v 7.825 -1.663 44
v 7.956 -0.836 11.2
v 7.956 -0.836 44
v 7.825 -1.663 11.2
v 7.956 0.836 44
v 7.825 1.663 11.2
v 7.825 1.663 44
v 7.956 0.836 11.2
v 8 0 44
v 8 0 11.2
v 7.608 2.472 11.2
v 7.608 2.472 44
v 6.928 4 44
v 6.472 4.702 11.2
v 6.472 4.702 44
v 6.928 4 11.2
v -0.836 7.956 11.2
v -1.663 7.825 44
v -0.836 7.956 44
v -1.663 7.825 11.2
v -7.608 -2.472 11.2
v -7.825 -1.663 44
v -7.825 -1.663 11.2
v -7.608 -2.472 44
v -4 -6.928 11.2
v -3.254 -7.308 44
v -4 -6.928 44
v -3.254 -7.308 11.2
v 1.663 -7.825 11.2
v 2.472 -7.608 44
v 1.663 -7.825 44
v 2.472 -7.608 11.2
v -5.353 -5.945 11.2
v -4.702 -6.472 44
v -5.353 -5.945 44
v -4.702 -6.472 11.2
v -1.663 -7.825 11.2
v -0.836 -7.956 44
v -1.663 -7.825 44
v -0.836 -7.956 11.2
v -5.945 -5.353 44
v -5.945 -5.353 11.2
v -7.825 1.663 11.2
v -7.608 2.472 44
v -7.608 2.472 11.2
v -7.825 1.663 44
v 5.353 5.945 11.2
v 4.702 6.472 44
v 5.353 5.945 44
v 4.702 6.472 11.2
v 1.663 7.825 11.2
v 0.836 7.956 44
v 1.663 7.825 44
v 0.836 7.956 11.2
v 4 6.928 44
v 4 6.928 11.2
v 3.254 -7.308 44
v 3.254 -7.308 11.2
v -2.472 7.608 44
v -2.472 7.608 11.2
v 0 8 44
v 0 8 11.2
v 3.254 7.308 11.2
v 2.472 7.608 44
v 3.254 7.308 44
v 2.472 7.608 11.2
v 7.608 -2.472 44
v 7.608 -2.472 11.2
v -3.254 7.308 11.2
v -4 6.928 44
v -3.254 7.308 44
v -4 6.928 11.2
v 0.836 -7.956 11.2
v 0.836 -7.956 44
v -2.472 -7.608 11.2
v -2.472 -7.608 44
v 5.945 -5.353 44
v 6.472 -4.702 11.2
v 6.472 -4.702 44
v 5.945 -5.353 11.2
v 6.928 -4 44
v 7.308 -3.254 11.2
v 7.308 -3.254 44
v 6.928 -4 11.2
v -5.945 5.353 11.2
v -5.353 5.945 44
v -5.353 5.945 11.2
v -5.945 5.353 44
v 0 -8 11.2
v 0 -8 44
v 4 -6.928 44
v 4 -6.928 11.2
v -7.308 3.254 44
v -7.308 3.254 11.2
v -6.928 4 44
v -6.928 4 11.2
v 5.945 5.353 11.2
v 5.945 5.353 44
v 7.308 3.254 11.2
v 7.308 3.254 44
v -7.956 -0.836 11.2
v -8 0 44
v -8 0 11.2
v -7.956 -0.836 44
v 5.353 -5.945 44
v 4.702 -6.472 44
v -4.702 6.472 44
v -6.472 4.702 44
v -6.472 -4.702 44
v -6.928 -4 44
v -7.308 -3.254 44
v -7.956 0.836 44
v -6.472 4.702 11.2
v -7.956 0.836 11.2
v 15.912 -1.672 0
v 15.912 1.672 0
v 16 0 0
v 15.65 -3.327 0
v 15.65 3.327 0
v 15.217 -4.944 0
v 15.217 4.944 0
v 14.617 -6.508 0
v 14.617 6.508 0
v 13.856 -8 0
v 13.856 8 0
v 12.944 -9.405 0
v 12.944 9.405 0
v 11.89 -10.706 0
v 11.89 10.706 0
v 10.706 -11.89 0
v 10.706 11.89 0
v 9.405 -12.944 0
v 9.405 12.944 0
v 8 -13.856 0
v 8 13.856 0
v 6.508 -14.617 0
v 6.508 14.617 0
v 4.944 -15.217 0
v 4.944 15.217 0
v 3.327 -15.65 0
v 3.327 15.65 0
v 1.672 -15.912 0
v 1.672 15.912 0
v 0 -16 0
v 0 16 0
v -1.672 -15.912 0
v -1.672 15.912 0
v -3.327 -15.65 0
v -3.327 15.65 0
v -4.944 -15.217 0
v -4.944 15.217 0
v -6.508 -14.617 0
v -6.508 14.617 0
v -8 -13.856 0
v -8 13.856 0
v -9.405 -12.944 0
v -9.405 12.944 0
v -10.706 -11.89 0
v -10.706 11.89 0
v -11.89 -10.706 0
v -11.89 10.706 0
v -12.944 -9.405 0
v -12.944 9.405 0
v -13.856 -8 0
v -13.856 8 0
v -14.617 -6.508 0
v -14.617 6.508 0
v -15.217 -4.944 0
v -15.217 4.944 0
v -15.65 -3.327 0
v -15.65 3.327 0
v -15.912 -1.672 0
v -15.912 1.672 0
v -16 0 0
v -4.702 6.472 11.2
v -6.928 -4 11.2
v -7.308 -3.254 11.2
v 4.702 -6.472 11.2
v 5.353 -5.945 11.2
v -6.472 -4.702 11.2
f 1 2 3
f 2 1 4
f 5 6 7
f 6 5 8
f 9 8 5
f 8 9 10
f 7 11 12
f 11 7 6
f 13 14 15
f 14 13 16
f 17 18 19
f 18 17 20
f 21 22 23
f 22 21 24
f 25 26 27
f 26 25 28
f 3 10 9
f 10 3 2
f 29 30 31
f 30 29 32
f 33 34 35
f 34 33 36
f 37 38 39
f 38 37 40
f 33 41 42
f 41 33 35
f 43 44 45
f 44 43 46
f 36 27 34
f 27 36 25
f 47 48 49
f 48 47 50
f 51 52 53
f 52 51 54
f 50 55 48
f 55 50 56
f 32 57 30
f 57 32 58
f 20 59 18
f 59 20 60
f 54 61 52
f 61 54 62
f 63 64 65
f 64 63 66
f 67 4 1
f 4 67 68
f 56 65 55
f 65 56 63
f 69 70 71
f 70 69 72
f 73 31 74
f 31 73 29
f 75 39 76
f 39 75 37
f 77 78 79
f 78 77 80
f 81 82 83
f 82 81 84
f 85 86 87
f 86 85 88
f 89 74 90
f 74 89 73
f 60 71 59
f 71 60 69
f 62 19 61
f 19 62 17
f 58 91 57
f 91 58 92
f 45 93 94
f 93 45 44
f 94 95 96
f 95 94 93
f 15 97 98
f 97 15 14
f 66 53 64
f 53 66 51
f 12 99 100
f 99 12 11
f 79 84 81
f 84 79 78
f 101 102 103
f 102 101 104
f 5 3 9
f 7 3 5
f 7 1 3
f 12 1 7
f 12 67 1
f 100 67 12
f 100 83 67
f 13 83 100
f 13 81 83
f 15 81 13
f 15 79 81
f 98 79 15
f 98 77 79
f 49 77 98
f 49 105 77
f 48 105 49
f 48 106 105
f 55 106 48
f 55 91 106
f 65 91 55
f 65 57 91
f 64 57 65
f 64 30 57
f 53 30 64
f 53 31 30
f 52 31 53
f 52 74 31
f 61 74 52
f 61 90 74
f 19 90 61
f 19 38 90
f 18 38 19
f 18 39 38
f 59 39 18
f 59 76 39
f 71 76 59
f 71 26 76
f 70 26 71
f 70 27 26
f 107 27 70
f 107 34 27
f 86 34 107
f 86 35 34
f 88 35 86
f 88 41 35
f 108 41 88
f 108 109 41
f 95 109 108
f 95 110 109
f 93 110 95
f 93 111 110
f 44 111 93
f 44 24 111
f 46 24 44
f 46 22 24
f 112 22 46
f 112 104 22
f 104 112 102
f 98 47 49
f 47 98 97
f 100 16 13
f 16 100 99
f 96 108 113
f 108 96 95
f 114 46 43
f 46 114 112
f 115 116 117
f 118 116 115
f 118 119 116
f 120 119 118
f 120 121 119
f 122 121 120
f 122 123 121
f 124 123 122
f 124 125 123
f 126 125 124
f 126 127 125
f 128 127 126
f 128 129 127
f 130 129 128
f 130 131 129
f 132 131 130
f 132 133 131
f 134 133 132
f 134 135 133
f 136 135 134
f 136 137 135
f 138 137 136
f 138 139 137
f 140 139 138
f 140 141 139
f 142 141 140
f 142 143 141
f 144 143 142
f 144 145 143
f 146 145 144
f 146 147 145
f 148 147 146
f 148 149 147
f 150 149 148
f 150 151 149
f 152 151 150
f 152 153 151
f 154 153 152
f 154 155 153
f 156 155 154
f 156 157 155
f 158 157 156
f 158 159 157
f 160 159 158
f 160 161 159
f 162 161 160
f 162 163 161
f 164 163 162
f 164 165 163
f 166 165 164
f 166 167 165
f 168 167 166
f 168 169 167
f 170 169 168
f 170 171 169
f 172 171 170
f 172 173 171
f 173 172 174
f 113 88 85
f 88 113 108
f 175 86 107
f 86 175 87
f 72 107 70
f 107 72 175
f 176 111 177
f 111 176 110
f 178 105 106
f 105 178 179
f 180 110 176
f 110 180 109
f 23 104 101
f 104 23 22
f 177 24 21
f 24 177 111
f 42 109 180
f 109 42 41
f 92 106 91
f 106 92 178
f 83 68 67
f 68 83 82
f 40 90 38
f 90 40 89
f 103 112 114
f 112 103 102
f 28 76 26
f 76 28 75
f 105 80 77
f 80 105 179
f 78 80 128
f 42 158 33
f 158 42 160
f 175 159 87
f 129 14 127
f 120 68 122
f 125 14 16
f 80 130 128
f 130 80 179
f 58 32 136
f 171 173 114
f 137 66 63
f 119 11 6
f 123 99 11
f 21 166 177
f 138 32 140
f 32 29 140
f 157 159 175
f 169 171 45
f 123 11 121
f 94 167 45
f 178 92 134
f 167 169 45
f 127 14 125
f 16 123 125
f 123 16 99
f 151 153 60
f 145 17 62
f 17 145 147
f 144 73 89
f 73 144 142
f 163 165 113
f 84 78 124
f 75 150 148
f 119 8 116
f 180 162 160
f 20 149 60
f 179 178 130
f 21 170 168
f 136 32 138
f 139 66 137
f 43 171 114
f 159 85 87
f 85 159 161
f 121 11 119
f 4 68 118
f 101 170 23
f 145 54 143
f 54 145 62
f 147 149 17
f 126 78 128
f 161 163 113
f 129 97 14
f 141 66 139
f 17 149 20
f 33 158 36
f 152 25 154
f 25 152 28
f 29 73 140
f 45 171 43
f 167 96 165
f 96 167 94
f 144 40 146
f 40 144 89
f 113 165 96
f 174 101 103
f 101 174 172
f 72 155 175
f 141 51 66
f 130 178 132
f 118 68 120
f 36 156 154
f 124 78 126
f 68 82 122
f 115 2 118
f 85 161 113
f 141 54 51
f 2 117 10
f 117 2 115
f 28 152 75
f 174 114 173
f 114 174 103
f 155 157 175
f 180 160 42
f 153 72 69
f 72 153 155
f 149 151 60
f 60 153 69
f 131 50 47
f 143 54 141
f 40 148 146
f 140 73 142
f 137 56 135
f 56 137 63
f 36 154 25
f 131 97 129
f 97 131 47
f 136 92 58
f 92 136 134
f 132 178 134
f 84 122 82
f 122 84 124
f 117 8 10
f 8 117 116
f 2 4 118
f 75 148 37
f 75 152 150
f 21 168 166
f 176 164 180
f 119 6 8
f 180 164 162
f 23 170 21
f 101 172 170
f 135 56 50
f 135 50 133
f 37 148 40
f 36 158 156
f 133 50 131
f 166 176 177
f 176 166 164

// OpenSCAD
// Solid rivet.
$fn = 60;
eps = 0.02;
shank_d = 16;
head_d = 32;
length = 44;
union() { cylinder(d=shank_d,h=length); cylinder(d1=head_d,d2=shank_d,h=head_d*0.35); }
